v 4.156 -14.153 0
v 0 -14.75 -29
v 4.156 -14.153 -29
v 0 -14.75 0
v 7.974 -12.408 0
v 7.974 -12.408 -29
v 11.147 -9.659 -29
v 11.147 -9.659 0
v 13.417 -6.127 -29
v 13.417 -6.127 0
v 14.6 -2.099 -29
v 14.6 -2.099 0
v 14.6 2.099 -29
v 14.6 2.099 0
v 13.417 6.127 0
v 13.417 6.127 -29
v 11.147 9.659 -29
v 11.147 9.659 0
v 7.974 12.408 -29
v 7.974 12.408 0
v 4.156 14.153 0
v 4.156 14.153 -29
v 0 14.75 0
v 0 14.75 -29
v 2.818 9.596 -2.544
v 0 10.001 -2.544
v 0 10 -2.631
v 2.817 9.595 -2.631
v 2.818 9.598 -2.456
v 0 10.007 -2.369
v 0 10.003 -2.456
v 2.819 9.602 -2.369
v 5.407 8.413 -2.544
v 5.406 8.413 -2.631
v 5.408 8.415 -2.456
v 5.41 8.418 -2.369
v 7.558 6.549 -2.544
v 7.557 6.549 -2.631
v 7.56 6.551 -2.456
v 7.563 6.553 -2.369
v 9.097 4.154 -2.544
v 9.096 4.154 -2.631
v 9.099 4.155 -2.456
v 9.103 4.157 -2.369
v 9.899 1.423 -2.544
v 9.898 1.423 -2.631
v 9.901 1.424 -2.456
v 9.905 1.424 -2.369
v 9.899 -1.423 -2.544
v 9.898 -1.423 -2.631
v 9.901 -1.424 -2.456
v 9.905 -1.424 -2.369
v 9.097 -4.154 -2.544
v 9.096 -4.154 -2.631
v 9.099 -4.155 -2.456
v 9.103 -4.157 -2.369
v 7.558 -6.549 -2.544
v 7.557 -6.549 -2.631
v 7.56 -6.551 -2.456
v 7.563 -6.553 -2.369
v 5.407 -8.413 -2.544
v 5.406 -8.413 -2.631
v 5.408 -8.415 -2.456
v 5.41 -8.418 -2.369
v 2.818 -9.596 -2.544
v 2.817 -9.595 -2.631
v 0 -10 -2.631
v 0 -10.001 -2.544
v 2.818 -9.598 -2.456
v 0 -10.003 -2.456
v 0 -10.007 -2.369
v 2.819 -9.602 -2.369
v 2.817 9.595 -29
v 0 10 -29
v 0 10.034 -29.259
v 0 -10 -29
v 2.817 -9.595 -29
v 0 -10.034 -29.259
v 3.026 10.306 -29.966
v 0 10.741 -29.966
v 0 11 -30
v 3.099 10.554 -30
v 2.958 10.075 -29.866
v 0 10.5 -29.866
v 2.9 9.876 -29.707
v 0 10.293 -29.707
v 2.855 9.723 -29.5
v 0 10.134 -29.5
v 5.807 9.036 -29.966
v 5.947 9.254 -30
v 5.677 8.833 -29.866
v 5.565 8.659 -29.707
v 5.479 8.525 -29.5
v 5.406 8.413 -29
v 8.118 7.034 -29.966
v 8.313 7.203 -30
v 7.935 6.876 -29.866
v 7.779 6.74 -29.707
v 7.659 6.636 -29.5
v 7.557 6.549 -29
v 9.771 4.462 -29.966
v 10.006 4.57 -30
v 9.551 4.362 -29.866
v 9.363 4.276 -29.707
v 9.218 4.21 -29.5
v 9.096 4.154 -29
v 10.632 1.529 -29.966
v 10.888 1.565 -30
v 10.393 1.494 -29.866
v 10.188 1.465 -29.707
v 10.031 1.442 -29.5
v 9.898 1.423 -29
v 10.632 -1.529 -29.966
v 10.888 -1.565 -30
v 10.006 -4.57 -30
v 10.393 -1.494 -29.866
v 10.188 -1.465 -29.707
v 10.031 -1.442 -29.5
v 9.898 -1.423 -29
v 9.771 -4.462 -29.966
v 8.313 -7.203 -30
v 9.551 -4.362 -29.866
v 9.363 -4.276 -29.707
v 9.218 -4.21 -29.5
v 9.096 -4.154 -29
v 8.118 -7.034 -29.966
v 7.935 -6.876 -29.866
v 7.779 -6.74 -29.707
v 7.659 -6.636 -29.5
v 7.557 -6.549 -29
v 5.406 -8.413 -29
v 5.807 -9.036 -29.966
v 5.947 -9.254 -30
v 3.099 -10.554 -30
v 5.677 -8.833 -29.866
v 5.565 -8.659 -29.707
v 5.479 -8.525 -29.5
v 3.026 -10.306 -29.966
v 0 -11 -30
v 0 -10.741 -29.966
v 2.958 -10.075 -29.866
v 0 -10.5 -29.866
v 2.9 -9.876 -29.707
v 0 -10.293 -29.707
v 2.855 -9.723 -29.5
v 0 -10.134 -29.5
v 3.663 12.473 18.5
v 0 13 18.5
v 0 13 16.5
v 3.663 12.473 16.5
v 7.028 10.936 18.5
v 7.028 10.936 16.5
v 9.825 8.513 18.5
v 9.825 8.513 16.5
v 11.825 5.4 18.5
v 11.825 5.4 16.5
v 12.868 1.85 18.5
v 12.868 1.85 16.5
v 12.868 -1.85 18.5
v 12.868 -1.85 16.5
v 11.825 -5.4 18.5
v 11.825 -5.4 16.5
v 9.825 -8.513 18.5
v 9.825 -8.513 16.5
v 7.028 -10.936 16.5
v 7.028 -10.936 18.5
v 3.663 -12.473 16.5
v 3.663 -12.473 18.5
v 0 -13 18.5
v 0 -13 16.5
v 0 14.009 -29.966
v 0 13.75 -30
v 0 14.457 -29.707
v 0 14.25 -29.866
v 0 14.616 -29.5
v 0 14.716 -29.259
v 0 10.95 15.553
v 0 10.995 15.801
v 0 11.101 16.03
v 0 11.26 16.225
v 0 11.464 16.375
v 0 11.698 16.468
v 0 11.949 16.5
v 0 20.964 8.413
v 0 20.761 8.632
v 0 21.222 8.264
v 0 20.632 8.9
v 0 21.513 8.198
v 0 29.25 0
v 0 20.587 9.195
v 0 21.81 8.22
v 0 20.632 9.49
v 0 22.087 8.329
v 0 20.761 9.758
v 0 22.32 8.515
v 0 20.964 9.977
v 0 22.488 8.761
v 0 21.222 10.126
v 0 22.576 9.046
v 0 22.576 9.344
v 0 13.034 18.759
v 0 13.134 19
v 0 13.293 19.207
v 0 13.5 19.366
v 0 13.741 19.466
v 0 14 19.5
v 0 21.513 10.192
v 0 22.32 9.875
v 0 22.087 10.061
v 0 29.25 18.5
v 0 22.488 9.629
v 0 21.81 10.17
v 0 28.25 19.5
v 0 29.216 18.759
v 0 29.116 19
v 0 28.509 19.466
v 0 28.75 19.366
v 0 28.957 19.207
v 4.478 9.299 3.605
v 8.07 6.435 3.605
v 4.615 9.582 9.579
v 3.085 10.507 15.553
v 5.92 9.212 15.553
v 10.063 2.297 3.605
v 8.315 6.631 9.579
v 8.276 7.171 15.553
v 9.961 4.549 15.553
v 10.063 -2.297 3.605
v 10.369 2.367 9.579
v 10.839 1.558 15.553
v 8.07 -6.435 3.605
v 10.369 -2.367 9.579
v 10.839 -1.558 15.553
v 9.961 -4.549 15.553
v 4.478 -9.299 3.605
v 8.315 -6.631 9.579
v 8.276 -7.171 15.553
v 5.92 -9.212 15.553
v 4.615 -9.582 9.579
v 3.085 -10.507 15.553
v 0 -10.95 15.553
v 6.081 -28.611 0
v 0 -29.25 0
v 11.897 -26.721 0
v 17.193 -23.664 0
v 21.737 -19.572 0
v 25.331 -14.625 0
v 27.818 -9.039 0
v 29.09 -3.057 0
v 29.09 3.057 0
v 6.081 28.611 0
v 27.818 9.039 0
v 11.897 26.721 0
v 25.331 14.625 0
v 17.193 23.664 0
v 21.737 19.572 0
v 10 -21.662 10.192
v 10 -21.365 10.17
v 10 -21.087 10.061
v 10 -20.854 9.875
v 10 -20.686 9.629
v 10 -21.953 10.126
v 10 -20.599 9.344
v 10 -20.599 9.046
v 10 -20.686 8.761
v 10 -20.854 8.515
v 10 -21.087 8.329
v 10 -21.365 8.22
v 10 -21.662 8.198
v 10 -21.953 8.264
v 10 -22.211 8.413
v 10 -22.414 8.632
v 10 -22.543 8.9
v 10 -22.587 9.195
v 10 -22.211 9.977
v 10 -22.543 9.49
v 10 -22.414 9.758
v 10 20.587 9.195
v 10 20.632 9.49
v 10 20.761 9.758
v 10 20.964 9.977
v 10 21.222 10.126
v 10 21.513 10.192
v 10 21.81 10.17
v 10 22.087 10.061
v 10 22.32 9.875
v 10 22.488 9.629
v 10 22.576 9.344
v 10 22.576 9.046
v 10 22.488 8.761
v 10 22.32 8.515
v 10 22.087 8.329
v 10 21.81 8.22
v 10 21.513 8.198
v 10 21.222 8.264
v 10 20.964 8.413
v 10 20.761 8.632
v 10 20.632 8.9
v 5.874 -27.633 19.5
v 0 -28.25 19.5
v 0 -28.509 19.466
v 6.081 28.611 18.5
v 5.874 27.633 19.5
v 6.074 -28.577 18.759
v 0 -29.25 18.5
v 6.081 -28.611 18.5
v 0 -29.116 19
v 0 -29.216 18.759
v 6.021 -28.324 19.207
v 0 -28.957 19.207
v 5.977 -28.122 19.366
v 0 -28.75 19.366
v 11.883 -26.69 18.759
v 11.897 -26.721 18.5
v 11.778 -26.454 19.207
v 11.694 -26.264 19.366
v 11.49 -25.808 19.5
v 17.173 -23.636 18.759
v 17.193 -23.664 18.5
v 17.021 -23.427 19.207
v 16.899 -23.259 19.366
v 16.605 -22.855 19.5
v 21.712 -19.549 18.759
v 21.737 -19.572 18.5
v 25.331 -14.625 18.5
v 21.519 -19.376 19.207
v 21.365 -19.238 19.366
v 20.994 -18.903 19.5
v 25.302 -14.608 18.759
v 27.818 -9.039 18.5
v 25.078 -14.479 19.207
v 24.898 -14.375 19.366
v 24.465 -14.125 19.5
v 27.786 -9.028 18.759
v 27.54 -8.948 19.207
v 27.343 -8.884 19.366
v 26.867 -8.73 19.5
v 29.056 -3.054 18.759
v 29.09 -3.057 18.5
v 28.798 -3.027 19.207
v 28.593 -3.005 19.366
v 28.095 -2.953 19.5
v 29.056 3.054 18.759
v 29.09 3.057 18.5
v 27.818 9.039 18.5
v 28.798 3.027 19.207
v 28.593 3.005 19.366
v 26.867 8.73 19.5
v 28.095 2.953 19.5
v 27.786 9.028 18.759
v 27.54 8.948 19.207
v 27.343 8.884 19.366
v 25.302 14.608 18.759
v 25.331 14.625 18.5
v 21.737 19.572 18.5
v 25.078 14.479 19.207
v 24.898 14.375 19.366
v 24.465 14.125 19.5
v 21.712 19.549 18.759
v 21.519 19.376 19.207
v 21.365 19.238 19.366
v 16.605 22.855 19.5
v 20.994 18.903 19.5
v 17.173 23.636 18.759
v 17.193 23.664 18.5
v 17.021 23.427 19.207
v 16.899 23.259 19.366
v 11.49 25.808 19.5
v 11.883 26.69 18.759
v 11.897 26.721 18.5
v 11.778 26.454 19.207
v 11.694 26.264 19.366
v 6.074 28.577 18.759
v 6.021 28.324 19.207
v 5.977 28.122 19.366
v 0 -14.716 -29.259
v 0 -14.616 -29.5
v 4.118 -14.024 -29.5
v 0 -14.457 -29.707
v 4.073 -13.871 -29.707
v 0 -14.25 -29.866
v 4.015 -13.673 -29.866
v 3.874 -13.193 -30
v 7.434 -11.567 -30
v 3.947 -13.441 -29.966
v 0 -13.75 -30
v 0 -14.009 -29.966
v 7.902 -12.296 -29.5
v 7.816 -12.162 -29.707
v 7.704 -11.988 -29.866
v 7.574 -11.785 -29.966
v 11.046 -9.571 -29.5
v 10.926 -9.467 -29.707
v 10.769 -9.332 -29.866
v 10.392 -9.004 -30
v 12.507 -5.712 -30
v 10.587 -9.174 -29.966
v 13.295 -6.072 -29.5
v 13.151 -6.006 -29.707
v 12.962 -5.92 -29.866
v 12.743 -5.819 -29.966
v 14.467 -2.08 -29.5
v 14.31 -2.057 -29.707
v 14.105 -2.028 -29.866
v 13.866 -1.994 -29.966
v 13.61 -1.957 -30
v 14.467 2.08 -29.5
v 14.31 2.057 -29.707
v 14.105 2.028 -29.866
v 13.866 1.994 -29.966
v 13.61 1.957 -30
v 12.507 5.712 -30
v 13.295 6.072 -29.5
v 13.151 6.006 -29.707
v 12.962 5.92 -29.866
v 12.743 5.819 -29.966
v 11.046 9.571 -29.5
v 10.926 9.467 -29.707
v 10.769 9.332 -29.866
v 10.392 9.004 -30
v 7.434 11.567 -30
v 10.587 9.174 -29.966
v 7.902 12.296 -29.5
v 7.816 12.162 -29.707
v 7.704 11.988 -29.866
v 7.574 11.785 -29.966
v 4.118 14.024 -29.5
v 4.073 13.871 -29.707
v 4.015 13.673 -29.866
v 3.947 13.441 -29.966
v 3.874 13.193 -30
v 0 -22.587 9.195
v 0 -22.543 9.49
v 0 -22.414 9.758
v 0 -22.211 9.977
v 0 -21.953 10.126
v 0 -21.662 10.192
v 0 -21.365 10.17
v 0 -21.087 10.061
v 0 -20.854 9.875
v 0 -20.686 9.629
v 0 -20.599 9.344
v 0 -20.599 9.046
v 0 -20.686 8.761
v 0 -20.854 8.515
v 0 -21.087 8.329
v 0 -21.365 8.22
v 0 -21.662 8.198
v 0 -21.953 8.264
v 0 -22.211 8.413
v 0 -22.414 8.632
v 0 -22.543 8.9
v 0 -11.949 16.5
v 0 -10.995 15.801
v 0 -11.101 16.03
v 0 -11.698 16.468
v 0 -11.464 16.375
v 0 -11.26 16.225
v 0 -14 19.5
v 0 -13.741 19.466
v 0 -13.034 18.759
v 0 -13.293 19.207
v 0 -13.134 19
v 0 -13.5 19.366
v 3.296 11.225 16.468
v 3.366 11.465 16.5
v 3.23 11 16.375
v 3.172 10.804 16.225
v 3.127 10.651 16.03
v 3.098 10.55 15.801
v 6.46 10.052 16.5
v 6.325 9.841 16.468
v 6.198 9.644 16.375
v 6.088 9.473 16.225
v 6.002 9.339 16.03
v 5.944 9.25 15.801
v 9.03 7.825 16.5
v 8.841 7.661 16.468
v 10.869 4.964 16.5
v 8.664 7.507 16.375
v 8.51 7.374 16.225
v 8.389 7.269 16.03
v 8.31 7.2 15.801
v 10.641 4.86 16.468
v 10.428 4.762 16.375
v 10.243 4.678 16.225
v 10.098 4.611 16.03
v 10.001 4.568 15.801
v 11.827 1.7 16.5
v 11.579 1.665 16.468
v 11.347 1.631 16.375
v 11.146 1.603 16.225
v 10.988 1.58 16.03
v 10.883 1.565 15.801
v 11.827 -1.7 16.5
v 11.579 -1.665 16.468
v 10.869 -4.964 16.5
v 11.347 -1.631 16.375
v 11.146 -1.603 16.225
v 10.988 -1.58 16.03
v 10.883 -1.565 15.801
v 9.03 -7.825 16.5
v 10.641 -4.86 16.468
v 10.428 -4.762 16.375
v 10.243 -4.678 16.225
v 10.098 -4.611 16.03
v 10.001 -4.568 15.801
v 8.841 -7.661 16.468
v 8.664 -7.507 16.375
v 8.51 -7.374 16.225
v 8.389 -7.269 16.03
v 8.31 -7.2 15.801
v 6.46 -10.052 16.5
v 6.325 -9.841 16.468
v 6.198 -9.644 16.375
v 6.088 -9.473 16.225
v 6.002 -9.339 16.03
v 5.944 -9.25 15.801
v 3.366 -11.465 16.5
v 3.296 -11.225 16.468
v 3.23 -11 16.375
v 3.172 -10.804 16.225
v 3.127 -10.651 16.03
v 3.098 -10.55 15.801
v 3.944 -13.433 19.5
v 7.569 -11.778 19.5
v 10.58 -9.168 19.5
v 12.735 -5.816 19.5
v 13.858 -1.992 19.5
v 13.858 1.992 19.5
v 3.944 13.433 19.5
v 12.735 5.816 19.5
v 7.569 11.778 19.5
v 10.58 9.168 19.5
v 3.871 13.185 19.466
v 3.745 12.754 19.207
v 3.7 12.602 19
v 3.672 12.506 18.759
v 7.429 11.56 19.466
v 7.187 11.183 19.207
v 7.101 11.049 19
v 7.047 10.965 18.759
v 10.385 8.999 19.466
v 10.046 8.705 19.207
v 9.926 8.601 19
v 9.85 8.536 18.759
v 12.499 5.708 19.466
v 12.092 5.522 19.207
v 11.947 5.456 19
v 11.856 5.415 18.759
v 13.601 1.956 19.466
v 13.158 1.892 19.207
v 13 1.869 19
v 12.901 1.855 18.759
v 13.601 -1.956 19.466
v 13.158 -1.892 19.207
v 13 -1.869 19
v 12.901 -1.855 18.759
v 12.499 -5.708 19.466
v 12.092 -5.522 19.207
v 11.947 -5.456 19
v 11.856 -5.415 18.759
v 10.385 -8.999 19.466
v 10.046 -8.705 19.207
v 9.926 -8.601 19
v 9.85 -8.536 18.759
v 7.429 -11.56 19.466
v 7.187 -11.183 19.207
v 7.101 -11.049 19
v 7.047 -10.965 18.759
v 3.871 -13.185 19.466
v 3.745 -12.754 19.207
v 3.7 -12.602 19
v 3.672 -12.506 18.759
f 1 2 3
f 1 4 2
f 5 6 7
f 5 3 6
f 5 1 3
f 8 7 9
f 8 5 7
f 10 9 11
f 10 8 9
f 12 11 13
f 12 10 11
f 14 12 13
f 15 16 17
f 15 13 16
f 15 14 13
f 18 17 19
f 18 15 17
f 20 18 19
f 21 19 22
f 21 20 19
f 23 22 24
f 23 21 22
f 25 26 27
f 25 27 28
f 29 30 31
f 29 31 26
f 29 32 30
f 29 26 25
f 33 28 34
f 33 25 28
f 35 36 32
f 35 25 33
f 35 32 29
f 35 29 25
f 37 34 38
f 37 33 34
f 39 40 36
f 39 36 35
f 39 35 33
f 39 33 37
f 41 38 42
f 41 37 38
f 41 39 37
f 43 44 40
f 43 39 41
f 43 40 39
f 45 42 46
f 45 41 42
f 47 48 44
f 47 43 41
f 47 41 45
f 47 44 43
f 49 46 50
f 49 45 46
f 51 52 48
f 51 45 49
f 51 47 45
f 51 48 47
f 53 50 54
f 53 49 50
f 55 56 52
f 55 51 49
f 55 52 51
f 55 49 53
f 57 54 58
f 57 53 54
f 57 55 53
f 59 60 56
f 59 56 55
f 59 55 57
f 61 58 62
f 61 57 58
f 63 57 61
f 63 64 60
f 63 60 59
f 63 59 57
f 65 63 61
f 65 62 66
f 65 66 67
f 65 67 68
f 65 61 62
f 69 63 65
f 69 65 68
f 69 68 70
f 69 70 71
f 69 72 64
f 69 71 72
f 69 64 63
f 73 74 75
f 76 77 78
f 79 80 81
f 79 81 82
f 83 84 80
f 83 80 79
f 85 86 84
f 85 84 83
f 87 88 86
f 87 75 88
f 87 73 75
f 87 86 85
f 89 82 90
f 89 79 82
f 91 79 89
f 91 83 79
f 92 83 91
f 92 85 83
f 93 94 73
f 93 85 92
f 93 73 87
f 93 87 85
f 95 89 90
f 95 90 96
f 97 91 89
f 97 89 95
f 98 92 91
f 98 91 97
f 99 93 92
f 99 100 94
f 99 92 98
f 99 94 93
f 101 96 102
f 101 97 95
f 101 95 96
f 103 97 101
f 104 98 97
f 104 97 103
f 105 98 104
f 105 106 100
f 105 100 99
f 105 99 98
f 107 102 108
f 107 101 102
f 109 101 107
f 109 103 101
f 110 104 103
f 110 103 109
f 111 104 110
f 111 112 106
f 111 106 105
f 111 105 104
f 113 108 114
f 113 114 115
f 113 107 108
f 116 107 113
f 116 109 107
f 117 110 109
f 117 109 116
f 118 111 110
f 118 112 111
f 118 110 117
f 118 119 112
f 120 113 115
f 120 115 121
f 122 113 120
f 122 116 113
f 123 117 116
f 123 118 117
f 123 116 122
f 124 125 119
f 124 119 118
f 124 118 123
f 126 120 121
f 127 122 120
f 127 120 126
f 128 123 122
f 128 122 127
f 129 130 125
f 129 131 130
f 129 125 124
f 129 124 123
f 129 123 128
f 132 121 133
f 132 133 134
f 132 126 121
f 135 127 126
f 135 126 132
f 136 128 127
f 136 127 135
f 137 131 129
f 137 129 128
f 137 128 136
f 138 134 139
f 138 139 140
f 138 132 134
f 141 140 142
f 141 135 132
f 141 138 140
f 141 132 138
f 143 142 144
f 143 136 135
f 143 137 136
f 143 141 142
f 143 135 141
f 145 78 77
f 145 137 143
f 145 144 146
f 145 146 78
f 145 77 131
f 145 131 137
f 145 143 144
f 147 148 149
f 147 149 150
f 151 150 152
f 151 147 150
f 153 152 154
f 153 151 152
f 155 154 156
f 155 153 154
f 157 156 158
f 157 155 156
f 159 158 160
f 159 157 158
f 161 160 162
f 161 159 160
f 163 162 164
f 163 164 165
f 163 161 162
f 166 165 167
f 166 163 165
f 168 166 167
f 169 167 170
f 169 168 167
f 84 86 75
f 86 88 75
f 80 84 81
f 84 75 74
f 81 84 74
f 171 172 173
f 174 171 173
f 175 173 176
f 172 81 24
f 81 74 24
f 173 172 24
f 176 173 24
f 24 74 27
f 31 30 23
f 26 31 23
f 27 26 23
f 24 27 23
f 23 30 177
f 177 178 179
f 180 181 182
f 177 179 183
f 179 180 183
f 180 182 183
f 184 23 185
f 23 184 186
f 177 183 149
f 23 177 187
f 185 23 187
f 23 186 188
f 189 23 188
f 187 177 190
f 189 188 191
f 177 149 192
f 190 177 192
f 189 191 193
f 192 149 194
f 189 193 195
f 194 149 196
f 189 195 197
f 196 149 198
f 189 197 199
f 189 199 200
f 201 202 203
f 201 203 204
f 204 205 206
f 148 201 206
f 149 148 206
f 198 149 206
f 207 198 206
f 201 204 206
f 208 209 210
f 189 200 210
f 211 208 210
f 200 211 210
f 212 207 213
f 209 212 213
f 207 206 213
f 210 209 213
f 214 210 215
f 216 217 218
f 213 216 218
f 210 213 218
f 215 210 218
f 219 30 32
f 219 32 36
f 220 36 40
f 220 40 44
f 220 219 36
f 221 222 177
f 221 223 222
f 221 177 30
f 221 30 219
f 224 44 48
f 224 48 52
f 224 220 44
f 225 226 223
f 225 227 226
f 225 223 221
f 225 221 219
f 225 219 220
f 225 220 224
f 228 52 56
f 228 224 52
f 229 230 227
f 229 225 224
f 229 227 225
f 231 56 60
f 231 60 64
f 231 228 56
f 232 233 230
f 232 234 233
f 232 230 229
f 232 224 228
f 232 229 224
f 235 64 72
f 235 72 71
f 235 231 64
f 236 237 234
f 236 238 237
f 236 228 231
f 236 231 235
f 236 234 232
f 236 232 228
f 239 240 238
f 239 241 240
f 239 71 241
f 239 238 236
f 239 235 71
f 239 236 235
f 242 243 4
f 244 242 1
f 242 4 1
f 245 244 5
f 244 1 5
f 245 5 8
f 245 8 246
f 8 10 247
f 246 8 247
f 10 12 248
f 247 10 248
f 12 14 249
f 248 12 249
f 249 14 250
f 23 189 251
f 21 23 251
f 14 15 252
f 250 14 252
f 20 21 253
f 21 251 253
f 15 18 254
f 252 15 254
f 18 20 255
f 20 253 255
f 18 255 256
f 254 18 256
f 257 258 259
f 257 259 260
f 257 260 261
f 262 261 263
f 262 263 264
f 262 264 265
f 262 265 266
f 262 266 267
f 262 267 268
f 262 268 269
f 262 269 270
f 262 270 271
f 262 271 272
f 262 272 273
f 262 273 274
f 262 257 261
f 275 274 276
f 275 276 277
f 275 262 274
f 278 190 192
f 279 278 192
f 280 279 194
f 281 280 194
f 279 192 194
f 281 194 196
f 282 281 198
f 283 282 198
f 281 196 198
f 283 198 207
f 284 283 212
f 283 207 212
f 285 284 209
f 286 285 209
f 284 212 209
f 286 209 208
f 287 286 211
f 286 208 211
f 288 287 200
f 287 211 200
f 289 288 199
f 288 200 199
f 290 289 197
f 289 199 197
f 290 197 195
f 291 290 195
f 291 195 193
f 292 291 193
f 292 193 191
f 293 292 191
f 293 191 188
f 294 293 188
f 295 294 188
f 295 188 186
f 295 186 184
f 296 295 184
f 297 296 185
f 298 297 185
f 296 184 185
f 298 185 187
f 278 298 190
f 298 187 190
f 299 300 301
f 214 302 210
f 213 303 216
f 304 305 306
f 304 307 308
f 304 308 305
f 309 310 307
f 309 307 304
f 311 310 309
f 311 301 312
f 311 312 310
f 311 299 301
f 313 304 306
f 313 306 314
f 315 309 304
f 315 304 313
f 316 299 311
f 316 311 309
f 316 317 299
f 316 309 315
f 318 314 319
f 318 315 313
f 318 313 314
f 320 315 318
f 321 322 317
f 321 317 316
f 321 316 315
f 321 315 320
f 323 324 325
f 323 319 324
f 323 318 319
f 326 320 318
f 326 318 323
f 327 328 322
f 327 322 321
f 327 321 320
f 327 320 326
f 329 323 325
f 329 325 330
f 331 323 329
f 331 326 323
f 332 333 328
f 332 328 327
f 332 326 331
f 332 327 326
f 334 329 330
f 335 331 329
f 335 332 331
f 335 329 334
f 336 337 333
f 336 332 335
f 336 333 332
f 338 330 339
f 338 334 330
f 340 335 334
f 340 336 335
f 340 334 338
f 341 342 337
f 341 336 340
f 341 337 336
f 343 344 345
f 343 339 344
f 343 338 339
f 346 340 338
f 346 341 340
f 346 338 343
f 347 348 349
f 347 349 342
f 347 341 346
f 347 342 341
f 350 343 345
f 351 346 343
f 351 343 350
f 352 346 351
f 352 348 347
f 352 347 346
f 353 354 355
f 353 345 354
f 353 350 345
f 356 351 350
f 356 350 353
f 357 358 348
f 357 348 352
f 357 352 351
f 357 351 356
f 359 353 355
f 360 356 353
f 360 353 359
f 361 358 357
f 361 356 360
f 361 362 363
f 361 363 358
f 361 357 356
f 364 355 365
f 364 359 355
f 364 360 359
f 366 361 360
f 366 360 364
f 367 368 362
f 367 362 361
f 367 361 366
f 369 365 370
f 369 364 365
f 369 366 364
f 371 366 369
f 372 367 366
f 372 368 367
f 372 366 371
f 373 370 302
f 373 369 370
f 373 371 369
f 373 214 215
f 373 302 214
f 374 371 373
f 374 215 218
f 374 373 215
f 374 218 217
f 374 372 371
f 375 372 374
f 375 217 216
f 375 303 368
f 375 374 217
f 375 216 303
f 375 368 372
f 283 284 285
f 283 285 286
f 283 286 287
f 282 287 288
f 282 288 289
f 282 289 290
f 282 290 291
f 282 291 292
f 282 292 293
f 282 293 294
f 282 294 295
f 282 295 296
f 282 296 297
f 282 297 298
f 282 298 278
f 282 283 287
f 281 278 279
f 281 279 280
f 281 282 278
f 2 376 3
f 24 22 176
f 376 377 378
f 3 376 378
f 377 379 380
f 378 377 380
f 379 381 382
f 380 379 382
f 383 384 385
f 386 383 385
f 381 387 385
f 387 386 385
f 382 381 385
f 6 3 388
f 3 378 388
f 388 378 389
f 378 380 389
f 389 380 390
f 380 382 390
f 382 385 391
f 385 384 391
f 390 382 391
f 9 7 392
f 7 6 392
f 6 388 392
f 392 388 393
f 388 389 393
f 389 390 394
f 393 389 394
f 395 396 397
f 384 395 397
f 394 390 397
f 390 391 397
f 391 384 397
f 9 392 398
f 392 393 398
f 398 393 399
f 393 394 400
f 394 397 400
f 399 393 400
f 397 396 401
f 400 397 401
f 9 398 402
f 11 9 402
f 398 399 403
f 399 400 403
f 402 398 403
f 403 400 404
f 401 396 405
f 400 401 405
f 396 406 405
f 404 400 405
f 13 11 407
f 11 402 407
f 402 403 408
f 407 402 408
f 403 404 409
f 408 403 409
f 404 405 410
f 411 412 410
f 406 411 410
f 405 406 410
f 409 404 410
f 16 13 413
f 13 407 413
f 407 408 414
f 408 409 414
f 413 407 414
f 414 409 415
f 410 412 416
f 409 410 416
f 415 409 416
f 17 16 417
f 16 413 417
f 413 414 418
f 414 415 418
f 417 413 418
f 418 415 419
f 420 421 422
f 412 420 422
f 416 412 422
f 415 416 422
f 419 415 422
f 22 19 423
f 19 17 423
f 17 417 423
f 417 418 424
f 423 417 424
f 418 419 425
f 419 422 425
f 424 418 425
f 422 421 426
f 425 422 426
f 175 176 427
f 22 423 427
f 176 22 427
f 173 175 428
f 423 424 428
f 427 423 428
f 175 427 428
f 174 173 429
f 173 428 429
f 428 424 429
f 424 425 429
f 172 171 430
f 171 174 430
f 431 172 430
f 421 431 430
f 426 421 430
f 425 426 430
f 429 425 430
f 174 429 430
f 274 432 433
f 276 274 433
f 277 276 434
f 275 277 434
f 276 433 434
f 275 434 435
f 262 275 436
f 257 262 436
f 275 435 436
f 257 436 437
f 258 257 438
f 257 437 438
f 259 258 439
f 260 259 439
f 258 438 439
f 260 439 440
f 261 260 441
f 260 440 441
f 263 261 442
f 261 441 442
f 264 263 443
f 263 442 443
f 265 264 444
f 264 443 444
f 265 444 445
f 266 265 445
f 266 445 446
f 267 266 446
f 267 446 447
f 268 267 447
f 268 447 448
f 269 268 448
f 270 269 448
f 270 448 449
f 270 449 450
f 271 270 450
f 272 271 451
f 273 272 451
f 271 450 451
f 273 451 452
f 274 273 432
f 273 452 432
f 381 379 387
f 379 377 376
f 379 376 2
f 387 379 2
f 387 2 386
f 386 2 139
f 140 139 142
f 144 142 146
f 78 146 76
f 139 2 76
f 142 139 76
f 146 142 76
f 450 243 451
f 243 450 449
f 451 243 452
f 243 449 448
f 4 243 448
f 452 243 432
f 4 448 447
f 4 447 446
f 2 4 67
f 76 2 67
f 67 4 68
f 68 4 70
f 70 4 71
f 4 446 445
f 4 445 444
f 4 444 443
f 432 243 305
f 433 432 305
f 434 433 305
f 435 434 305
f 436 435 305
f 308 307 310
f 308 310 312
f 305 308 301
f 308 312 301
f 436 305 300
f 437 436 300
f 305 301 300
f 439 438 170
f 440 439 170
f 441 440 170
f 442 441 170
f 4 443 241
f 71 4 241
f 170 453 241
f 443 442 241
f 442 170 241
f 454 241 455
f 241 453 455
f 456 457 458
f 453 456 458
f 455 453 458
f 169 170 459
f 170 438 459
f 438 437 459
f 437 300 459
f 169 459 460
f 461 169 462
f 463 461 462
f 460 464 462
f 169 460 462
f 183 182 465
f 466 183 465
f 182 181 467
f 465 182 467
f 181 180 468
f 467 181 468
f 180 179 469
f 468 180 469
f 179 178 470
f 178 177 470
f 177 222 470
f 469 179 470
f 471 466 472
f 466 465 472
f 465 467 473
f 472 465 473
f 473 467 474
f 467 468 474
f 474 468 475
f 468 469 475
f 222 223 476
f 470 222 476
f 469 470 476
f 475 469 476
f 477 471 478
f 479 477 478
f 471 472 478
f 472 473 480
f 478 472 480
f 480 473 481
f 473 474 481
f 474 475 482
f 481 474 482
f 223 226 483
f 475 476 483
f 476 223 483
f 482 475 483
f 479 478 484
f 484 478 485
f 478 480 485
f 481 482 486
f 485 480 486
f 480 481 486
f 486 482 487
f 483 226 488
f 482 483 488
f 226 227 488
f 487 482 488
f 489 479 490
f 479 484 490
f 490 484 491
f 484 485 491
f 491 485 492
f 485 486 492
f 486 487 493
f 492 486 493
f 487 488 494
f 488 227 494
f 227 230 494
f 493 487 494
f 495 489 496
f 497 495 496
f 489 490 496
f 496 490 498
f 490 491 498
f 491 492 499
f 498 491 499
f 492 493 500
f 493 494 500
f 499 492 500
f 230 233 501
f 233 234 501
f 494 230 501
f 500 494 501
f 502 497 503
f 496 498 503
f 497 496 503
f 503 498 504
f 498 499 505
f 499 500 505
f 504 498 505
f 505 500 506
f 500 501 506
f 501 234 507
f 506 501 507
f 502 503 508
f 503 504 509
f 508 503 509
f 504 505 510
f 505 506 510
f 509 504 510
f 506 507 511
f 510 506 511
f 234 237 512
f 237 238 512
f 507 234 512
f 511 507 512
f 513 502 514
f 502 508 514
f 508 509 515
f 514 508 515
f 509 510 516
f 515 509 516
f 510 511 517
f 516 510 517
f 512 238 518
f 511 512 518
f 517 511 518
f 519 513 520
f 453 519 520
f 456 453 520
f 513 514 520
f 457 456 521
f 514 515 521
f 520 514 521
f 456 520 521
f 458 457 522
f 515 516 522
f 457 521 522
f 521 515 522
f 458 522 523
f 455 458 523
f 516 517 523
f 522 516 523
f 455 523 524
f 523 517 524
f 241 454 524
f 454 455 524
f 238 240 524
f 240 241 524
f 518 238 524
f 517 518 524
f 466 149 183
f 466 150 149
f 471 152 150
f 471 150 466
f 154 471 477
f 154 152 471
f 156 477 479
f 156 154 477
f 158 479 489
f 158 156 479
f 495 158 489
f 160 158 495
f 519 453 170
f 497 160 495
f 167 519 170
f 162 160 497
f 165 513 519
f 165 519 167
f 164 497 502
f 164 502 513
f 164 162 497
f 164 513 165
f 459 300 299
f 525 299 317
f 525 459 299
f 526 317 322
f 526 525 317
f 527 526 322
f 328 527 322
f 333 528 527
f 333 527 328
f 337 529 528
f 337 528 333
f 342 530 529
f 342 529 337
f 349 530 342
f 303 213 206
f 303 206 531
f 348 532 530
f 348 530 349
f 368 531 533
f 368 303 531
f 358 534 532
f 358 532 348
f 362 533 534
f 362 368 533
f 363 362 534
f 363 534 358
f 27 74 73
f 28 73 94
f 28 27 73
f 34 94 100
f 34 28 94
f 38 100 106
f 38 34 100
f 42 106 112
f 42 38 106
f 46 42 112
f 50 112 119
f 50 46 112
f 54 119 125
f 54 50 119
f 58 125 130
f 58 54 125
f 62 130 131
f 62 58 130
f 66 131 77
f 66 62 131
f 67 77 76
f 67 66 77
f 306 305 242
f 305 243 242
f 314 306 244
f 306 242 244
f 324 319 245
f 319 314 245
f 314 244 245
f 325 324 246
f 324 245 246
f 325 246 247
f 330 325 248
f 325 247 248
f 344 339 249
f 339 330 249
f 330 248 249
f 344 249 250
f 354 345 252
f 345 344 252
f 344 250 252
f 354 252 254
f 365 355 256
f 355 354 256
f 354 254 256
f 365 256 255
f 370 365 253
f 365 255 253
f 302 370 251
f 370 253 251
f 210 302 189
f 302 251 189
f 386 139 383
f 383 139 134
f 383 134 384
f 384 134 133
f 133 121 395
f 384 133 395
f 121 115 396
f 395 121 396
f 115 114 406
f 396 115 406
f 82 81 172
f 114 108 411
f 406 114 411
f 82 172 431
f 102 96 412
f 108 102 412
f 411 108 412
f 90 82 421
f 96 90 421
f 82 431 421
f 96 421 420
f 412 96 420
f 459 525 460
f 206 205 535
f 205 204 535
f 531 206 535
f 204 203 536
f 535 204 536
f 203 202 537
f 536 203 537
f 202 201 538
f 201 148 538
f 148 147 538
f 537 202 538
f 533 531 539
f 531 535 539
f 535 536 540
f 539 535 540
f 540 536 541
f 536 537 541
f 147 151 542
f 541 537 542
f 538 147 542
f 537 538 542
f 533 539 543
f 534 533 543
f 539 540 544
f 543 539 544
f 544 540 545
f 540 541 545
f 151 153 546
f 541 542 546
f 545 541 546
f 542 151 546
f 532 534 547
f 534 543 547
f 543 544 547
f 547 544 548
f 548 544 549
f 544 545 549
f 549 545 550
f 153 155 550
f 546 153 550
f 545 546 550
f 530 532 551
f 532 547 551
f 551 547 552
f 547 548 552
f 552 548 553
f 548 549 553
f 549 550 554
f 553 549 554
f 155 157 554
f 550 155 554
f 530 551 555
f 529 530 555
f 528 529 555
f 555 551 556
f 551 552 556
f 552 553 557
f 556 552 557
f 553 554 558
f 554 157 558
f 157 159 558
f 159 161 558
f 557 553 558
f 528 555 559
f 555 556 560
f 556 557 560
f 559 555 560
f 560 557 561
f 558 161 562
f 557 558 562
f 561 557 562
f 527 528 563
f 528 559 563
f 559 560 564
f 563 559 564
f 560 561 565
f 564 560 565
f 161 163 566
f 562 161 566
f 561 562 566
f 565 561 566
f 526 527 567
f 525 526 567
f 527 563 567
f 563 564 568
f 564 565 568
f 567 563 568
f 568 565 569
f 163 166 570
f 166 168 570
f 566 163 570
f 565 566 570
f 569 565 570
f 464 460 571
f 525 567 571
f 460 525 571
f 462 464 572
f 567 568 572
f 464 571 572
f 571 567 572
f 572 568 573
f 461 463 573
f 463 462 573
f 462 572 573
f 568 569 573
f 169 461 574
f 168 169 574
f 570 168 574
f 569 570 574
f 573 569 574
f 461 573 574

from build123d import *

# Parameters (mm, degrees)
F0_R         = 14.75
F1_DEPTH     = 30
F2_R         = 29.25
F3_DEPTH     = 19.5
F6_R         = 1
F8_W         = 73.76781106
F8_H         = 74.6486261487
F9_DEPTH     = 29.2510001
F10_T2_ANGLE = 183.7729101698
F11_R        = 1
F12_DEPTH    = 10


# Not quite as in the source:
# - a fillet or chamfer that OpenCascade refuses, or shapes differently, is made with other operations: its cross-section is extruded or revolved along the edge and cut away or added


with BuildPart() as f1:
    # F0 (on Top) → F1 (new body)
    with BuildSketch(Plane.XY):
        Circle(F0_R)
    extrude(amount=-F1_DEPTH)

    # F2 (on face) → F3 (join)
    with BuildSketch(Plane.XY):
        Circle(F2_R)
    extrude(amount=F3_DEPTH)

    # F4 (on Right) → F5 (revolve, cut)
    with BuildSketch(Plane.YZ):
        Polygon((13, 16.5), (13, 19.5), (0, 19.5), (0, -30), (10, -30), (10, -2.5), (11, 16.5), align=None)
    revolve(axis=Axis((0, 0, 5.2055120468), (0, 0, -1)), mode=Mode.SUBTRACT)

    # F6
    f6_edges = [f1.edges().sort_by_distance(p)[0] for p in [
        (-29.25, 0, 19.5),
        (0, -11, 16.5),
        (0, -13, 19.5),
        (0, -10, -30),
        (-14.75, 0, -30),
    ]]
    fillet(f6_edges, radius=F6_R)

    # F8 (on offset) → F9 (cut, through all)
    with BuildSketch(Plane.YZ):
        Rectangle(F8_W, F8_H)
    extrude(amount=-F9_DEPTH, mode=Mode.SUBTRACT)

    # F10: fillet of radius 5 on 1 edges, made by hand

    # F10_s1 → F10_t2 (revolve, cut)
    with BuildSketch(Plane(origin=(0, 0, 0), x_dir=(0, 0, 1), z_dir=(-0.999458026, -0.0329189041, 0))):
        with BuildLine():
            ThreePointArc((-2.6314879522, 10), (-2.5000454426, 10.0017280119), (-2.3686937866, 10.0069108533))
            Line((-2.3686937866, 10.0069108533), (-2.5, 10))
            Line((-2.5, 10), (-2.6314879522, 10))
        make_face()
    revolve(axis=Axis((0, 0, -2.5), (0, 0, -1)), revolution_arc=F10_T2_ANGLE, mode=Mode.SUBTRACT)

    # F11 (on face) → F12 (cut)
    with BuildSketch(Plane(origin=(0, 0, 0), x_dir=(0, -1, 0), z_dir=(-1, 0, 0))):
        with Locations((-21.587398374, 9.1951219512)):
            Circle(F11_R)
        with Locations((21.587398374, 9.1951219512)):
            Circle(F11_R)
    extrude(amount=-F12_DEPTH, mode=Mode.SUBTRACT)


solid = f1.part
